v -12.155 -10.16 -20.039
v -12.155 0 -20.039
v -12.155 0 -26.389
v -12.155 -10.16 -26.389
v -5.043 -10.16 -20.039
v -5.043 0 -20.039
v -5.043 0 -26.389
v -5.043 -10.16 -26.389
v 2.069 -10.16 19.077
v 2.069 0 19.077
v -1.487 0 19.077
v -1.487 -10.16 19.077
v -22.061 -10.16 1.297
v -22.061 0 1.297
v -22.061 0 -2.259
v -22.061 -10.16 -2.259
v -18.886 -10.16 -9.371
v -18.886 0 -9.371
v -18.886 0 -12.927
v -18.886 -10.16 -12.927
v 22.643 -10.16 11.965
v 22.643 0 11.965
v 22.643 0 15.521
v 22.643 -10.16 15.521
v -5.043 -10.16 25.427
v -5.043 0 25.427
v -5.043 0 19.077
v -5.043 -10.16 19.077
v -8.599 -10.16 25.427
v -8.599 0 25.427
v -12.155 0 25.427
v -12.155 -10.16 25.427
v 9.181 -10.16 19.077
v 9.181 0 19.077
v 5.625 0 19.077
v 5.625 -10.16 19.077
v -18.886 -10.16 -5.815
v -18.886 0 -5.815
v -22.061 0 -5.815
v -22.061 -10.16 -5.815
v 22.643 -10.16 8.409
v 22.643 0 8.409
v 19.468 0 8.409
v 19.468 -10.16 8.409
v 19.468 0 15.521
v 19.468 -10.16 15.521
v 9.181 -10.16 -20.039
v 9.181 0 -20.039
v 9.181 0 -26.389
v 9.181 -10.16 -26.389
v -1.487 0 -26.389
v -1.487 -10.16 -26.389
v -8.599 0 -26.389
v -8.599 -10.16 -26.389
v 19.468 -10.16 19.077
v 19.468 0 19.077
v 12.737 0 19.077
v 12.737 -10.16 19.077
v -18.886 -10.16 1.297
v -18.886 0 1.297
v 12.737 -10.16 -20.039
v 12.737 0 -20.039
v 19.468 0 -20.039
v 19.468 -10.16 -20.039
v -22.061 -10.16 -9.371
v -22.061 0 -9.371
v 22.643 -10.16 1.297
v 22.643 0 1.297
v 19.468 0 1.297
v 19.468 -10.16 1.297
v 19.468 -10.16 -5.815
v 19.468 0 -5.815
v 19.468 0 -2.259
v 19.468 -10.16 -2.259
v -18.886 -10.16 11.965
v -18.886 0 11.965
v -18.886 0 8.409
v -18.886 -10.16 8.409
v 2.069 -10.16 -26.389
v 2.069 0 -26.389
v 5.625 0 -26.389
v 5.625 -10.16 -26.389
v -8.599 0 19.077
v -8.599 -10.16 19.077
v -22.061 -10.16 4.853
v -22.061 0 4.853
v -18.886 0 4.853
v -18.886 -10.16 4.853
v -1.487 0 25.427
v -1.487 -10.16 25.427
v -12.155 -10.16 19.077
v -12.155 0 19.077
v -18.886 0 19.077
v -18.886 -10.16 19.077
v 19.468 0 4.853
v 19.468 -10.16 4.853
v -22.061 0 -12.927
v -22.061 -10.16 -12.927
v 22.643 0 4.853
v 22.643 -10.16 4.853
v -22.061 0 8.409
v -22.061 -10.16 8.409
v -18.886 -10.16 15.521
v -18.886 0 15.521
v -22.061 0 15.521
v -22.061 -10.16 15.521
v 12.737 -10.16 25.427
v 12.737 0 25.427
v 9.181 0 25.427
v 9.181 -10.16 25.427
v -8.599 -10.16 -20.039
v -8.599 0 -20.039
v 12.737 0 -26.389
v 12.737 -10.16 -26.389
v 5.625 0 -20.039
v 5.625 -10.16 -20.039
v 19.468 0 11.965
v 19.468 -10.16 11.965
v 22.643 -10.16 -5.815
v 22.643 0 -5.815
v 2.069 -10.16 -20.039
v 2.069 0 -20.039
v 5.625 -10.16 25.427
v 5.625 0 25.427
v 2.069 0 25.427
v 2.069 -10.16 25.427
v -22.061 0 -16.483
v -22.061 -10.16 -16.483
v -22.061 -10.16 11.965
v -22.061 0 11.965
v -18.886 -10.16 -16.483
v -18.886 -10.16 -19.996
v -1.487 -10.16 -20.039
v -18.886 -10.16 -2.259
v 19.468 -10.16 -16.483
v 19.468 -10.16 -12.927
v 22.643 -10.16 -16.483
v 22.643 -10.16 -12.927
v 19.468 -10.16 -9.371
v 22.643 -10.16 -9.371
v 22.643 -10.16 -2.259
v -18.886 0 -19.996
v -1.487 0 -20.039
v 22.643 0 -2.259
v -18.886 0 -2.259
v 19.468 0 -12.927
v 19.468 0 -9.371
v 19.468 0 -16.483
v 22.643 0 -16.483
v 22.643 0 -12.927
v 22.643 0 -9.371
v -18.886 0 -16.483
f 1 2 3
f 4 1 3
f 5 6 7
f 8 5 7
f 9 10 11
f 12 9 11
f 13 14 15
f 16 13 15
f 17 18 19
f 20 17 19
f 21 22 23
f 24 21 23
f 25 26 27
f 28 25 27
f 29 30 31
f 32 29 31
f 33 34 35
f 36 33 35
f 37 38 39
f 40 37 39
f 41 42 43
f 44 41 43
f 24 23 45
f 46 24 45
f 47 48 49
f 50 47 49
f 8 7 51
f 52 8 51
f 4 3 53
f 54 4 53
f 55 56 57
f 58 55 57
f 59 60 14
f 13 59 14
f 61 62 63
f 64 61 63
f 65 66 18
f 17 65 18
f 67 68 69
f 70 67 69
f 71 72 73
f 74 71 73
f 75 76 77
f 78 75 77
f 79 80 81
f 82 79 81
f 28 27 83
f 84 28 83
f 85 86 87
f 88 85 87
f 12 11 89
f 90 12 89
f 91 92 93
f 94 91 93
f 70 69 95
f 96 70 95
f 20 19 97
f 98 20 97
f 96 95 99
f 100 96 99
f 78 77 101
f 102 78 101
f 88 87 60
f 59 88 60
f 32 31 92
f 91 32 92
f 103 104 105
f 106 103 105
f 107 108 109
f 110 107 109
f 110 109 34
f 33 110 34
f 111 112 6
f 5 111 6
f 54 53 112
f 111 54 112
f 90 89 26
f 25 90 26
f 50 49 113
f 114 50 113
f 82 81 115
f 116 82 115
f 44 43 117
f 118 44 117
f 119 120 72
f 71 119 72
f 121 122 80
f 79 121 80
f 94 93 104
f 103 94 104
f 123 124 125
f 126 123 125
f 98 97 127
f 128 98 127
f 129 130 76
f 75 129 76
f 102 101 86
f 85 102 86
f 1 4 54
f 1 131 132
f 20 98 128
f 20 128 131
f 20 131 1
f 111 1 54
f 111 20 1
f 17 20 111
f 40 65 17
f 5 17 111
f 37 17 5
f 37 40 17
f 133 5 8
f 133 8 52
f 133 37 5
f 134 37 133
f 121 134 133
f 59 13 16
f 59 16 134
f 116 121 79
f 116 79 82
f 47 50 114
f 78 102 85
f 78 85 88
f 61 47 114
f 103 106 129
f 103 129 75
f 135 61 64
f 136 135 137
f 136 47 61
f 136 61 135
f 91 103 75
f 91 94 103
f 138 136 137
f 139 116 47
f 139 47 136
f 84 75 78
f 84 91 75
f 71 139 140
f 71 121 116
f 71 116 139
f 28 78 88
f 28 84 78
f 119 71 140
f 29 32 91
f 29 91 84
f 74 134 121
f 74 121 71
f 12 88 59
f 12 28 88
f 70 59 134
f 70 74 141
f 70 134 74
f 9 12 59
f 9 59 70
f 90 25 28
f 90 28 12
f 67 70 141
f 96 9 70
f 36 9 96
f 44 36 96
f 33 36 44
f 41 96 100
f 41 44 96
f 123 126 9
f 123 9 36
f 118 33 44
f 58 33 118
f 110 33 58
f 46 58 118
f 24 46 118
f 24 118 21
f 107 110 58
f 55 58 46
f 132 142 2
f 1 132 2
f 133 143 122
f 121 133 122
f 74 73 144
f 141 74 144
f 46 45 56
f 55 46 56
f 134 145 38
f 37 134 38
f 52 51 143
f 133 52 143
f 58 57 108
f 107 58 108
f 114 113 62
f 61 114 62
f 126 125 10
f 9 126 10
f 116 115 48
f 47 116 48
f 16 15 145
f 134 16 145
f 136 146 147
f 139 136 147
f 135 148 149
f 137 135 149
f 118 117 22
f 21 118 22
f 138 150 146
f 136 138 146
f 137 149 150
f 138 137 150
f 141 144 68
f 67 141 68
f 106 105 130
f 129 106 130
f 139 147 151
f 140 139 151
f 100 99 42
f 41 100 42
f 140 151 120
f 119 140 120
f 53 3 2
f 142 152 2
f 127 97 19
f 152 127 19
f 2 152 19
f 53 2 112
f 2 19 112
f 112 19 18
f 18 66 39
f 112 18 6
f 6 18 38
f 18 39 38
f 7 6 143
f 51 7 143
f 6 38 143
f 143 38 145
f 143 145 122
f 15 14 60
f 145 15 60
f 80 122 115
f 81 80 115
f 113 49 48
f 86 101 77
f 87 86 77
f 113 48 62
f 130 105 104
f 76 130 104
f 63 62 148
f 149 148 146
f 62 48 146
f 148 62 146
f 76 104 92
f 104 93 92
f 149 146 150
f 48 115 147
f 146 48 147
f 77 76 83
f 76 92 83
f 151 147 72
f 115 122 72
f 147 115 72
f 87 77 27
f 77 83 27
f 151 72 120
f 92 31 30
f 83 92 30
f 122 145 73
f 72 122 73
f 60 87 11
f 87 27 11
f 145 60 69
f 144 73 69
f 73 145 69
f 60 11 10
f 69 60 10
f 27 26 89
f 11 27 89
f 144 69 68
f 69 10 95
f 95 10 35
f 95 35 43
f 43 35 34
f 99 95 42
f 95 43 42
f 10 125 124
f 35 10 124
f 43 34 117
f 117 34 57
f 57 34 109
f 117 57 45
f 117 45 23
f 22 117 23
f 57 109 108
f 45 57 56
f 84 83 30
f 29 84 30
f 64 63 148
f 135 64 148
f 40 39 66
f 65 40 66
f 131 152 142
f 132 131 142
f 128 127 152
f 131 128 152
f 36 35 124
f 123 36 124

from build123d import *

# Parameters (mm, degrees)
F1_DEPTH = 10.16


with BuildPart() as f1:
    # F0 (on Front) → F1 (new body)
    with BuildSketch(Plane.XZ):
        Polygon((-18.885527, -19.996368), (-12.154527, -20.039365), (-12.154527, -26.389365), (-8.598527, -26.389365), (-8.598527, -20.039365), (-5.042527, -20.039365), (-5.042527, -26.389365), (-1.486527, -26.389365), (-1.486527, -20.039365), (2.069473, -20.039365), (2.069473, -26.389365), (5.625473, -26.389365), (5.625473, -20.039365), (9.181473, -20.039365), (9.181473, -26.389365), (12.737473, -26.389365), (12.737473, -20.039365), (19.468473, -20.039365), (19.468473, -16.483365), (22.643473, -16.483365), (22.643473, -12.927365), (19.468473, -12.927365), (19.468473, -9.371365), (22.643473, -9.371365), (22.643473, -5.815365), (19.468473, -5.815365), (19.468473, -2.259365), (22.643473, -2.259365), (22.643473, 1.296635), (19.468473, 1.296635), (19.468473, 4.852635), (22.643473, 4.852635), (22.643473, 8.408635), (19.468473, 8.408635), (19.468473, 11.964635), (22.643473, 11.964635), (22.643473, 15.520635), (19.468473, 15.520635), (19.468473, 19.076635), (12.737473, 19.076635), (12.737473, 25.426635), (9.181473, 25.426635), (9.181473, 19.076635), (5.625473, 19.076635), (5.625473, 25.426635), (2.069473, 25.426635), (2.069473, 19.076635), (-1.486527, 19.076635), (-1.486527, 25.426635), (-5.042527, 25.426635), (-5.042527, 19.076635), (-8.598527, 19.076635), (-8.598527, 25.426635), (-12.154527, 25.426635), (-12.154527, 19.076635), (-18.885527, 19.076635), (-18.885527, 15.520635), (-22.060527, 15.520635), (-22.060527, 11.964635), (-18.885527, 11.964635), (-18.885527, 8.408635), (-22.060527, 8.408635), (-22.060527, 4.852635), (-18.885527, 4.852635), (-18.885527, 1.296635), (-22.060527, 1.296635), (-22.060527, -2.259365), (-18.885527, -2.259365), (-18.885527, -5.815365), (-22.060527, -5.815365), (-22.060527, -9.371365), (-18.885527, -9.371365), (-18.885527, -12.927365), (-22.060527, -12.927365), (-22.060527, -16.483365), (-18.885527, -16.483365), align=None)
    extrude(amount=F1_DEPTH)


solid = f1.part
